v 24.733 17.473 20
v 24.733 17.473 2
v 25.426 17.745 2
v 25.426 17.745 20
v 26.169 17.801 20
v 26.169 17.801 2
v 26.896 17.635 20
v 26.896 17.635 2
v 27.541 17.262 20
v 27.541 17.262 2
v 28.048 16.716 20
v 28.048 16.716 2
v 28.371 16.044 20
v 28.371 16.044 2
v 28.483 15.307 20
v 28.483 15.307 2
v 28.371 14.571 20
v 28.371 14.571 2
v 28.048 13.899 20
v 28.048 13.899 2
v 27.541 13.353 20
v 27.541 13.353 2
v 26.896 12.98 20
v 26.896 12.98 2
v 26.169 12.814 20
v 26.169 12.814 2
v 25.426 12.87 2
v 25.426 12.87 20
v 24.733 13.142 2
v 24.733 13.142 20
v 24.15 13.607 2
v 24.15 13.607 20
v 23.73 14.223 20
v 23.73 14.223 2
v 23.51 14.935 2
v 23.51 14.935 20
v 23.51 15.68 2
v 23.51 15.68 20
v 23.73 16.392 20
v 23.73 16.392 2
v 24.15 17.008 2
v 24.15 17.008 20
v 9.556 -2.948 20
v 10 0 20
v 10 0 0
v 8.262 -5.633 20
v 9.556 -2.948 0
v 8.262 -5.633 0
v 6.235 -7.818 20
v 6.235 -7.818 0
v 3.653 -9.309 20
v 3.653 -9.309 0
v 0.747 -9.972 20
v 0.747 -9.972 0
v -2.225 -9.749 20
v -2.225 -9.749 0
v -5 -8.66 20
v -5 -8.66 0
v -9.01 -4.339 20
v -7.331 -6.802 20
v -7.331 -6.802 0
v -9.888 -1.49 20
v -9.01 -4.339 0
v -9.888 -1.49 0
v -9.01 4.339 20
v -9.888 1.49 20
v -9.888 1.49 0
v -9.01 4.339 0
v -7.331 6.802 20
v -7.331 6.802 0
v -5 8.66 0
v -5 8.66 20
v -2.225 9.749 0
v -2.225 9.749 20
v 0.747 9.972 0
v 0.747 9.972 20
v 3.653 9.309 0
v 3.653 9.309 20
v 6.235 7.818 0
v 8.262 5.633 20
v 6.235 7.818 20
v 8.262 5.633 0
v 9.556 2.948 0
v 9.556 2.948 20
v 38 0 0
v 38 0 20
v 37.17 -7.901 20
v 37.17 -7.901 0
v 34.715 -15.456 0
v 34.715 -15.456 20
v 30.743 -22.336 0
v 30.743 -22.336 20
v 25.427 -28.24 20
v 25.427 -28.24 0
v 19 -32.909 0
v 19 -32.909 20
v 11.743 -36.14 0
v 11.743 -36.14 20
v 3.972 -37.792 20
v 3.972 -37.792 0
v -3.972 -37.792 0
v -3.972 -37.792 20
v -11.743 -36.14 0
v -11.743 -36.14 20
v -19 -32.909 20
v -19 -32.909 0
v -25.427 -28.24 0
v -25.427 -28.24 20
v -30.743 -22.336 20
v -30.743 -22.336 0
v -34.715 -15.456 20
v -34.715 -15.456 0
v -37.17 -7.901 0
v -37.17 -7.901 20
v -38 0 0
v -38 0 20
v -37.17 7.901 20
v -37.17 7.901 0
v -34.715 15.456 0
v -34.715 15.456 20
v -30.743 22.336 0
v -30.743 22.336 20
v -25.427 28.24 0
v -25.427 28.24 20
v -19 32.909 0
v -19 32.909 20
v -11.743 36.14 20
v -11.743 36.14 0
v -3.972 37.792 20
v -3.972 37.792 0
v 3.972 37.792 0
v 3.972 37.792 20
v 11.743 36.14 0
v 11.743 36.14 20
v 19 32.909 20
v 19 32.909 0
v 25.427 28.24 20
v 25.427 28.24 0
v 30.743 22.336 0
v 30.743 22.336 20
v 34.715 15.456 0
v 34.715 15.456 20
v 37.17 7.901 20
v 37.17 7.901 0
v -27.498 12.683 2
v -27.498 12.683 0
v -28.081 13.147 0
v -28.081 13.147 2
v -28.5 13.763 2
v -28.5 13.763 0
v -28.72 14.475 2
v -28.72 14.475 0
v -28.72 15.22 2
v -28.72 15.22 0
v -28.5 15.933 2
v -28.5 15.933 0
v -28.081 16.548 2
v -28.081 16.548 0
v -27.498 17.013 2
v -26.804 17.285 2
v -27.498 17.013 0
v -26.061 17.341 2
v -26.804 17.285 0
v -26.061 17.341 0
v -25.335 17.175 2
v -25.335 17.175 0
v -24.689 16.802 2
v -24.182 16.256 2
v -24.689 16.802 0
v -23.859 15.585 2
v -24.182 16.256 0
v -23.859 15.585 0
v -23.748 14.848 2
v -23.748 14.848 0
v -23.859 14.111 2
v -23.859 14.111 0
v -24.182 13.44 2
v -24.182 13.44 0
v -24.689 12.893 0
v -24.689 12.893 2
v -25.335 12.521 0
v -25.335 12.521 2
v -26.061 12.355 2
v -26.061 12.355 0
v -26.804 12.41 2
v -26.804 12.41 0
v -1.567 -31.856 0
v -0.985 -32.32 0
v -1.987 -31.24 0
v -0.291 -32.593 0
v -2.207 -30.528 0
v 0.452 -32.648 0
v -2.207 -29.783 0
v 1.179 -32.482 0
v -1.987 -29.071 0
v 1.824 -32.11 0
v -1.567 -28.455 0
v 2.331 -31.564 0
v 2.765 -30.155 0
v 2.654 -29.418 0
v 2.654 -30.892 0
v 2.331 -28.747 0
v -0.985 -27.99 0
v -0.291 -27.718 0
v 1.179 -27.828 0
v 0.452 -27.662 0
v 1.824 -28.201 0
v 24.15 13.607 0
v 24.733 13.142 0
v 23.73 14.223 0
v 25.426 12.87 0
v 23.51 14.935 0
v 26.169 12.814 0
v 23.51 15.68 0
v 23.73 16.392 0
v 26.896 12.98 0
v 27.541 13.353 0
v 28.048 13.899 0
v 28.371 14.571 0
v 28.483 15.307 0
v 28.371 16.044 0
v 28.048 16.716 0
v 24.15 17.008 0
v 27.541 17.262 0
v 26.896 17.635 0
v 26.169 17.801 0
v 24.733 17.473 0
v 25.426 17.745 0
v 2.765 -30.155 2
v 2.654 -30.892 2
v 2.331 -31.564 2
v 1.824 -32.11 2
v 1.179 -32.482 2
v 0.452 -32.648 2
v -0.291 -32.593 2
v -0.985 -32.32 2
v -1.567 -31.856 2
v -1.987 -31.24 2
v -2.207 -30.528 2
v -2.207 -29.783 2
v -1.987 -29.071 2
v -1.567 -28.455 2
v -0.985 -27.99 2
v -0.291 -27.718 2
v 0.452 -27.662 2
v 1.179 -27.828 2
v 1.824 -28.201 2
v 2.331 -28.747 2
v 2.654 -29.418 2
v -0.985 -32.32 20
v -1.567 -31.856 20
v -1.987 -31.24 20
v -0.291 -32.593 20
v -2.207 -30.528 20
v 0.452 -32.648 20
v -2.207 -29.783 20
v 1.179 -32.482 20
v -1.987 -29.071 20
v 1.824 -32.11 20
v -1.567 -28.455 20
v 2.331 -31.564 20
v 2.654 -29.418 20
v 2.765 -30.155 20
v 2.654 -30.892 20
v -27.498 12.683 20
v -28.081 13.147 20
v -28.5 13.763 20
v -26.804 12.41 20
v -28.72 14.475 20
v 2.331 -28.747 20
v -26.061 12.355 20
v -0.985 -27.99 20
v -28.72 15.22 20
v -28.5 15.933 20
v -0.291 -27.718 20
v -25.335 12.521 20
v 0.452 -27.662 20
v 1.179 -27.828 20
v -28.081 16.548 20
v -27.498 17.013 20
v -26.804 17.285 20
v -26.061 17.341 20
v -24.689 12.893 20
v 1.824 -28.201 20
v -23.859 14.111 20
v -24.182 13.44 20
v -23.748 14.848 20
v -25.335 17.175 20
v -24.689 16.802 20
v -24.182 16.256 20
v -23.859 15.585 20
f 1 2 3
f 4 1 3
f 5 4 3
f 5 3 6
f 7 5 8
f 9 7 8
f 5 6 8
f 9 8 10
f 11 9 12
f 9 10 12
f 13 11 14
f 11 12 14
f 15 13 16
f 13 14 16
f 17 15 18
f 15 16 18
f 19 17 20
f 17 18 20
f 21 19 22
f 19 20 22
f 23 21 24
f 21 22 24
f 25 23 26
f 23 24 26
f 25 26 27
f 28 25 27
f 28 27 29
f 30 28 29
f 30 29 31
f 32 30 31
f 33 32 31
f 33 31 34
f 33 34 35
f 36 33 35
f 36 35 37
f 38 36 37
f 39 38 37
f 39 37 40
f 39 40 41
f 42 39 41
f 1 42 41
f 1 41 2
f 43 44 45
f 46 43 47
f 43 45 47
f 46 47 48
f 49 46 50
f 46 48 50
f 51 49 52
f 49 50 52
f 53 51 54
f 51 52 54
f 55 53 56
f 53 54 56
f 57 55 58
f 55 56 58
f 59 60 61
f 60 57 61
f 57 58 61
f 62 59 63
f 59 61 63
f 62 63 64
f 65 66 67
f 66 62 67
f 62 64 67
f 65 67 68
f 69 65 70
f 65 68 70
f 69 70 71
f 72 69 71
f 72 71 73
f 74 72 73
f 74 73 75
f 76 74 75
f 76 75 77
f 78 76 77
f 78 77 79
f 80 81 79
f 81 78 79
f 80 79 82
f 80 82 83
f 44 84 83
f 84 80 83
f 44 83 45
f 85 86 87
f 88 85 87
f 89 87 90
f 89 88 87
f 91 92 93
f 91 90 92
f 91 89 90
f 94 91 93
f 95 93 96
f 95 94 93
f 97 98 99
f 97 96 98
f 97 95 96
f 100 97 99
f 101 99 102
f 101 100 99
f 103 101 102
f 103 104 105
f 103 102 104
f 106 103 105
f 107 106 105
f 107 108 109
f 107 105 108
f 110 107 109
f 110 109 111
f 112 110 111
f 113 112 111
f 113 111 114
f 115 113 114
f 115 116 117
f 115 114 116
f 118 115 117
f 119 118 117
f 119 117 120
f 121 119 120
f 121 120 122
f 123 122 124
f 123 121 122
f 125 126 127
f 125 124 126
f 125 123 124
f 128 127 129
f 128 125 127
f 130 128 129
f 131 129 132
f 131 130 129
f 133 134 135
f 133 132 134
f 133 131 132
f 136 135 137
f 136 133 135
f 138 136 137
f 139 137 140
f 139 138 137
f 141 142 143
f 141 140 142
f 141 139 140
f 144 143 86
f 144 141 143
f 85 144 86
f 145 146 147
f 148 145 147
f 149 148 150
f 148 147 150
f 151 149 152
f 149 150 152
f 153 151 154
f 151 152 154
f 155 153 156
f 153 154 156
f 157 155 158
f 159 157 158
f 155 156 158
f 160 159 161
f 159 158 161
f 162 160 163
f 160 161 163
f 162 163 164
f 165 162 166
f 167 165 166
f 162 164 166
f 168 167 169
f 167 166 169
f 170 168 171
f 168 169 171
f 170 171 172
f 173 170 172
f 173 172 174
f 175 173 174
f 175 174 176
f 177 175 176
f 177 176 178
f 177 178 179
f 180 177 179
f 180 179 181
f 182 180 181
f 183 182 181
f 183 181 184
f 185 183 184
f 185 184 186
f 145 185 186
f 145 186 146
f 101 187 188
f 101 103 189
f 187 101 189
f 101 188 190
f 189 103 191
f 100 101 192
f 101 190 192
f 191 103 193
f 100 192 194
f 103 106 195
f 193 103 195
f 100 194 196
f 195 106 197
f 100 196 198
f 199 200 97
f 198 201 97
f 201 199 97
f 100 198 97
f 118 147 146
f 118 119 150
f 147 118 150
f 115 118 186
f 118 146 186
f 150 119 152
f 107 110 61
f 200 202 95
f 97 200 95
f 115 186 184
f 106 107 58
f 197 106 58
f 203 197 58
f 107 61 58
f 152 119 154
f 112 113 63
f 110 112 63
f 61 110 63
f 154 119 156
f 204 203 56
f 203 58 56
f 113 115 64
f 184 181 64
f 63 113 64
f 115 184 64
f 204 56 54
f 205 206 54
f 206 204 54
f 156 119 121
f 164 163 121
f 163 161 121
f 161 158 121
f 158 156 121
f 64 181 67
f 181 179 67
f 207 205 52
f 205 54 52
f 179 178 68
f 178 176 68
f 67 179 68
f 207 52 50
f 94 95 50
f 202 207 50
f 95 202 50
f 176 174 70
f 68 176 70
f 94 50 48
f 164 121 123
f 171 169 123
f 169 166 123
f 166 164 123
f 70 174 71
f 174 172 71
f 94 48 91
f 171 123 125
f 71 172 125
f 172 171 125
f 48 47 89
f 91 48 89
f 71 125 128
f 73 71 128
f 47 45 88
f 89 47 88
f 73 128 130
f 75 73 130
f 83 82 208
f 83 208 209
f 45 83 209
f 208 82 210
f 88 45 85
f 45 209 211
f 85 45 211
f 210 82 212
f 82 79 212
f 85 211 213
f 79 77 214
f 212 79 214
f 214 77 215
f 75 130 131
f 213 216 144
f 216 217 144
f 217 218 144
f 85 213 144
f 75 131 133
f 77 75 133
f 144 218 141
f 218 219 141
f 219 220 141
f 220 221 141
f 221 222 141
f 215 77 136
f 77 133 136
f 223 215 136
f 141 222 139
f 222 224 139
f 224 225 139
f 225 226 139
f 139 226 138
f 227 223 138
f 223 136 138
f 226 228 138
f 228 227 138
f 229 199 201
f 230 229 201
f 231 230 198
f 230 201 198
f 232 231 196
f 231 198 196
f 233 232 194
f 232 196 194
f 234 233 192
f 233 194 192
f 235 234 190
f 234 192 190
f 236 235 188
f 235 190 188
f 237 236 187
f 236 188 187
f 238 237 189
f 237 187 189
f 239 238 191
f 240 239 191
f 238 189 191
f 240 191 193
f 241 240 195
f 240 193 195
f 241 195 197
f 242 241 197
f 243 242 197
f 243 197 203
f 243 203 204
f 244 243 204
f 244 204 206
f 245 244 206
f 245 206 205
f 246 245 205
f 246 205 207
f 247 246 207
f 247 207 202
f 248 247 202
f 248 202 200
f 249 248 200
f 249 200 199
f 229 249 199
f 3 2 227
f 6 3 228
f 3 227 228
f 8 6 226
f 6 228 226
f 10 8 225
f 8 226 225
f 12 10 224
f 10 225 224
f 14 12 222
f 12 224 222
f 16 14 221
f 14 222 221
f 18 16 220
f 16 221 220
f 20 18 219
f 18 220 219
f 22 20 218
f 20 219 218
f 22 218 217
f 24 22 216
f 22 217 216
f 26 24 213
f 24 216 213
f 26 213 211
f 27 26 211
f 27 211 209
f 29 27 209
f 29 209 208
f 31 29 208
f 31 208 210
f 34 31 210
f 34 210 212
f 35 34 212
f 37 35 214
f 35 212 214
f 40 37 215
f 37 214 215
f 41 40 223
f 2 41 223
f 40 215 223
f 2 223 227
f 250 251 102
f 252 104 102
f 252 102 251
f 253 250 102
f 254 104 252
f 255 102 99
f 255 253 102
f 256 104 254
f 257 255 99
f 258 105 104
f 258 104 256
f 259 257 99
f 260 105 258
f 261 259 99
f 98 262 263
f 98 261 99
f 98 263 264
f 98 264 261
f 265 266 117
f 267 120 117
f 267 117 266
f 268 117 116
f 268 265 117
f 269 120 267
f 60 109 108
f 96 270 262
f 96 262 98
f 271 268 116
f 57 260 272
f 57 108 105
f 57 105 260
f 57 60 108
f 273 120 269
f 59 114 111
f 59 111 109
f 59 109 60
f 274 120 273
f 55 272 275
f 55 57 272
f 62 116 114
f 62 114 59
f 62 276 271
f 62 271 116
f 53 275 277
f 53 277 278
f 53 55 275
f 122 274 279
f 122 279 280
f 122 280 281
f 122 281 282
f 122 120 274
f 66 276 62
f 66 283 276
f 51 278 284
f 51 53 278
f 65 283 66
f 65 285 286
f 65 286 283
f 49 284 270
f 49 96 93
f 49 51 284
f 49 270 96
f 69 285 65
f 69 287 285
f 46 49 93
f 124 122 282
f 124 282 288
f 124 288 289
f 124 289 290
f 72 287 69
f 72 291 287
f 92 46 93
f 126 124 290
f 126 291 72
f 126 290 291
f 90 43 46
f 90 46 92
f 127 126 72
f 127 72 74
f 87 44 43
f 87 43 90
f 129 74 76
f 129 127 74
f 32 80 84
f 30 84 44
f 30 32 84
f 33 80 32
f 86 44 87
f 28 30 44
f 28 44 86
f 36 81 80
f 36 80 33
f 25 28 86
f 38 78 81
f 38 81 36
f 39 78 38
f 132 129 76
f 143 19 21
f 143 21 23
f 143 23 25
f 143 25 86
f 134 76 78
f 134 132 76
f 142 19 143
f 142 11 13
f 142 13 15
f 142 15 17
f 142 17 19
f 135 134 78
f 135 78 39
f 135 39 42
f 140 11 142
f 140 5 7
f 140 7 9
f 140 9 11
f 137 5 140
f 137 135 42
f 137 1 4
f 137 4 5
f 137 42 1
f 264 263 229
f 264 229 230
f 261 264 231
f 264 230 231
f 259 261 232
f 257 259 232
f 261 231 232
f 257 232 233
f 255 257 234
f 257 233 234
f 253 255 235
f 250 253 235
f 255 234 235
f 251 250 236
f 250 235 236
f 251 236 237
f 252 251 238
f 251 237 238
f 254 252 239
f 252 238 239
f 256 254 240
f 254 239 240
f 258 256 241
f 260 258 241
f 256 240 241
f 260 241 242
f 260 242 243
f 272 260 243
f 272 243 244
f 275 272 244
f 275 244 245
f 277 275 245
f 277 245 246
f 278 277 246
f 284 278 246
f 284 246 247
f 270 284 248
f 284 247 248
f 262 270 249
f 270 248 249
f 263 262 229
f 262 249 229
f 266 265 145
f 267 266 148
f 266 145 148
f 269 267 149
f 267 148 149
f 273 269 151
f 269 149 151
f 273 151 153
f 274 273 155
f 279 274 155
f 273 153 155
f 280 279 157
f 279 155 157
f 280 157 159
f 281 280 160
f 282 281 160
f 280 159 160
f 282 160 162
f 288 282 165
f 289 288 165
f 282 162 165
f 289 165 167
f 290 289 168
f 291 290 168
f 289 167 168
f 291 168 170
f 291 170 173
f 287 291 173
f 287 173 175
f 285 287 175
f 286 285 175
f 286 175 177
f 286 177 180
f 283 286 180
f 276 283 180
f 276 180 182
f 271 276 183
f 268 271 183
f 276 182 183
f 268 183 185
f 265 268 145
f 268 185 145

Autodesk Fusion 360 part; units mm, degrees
sketch "Sketch1" plane through (0, 0, 0) normal (0, 0, 1) x (1, 0, 0)
  circle A0 centre (0, 0) radius 10
  circle A1 centre (0, 0) radius 22.5
  circle A2 centre (0, 0) radius 38
  dimension "d1" = 45
  dimension "d2" = 20
  dimension "d3" = 76
extrude "Extrude1" add sketch "Sketch1" along normal blind 20 contours A1
sketch "Sketch2" plane through (0, 0, 0) normal (0, 0, 1) x (1, 0, 0)
  circle A0 centre (0.2654, -30.1553) radius 2.5
  dimension "d8" = 5
extrude "Extrude4" add sketch "Sketch1" along normal blind 2 contours A1 | A2
extrude "Extrude5" cut sketch "Sketch2" along normal blind 6.312
pattern_circular "C-Pattern2" count 3 over 360 about axis through (0, 0, 2) along (0, 0, 1) of "Extrude5"
extrude "돌출6" add 1 faces at (-20.8034, 21.3677, 2) along direction (0, 0, 1) blind 18
